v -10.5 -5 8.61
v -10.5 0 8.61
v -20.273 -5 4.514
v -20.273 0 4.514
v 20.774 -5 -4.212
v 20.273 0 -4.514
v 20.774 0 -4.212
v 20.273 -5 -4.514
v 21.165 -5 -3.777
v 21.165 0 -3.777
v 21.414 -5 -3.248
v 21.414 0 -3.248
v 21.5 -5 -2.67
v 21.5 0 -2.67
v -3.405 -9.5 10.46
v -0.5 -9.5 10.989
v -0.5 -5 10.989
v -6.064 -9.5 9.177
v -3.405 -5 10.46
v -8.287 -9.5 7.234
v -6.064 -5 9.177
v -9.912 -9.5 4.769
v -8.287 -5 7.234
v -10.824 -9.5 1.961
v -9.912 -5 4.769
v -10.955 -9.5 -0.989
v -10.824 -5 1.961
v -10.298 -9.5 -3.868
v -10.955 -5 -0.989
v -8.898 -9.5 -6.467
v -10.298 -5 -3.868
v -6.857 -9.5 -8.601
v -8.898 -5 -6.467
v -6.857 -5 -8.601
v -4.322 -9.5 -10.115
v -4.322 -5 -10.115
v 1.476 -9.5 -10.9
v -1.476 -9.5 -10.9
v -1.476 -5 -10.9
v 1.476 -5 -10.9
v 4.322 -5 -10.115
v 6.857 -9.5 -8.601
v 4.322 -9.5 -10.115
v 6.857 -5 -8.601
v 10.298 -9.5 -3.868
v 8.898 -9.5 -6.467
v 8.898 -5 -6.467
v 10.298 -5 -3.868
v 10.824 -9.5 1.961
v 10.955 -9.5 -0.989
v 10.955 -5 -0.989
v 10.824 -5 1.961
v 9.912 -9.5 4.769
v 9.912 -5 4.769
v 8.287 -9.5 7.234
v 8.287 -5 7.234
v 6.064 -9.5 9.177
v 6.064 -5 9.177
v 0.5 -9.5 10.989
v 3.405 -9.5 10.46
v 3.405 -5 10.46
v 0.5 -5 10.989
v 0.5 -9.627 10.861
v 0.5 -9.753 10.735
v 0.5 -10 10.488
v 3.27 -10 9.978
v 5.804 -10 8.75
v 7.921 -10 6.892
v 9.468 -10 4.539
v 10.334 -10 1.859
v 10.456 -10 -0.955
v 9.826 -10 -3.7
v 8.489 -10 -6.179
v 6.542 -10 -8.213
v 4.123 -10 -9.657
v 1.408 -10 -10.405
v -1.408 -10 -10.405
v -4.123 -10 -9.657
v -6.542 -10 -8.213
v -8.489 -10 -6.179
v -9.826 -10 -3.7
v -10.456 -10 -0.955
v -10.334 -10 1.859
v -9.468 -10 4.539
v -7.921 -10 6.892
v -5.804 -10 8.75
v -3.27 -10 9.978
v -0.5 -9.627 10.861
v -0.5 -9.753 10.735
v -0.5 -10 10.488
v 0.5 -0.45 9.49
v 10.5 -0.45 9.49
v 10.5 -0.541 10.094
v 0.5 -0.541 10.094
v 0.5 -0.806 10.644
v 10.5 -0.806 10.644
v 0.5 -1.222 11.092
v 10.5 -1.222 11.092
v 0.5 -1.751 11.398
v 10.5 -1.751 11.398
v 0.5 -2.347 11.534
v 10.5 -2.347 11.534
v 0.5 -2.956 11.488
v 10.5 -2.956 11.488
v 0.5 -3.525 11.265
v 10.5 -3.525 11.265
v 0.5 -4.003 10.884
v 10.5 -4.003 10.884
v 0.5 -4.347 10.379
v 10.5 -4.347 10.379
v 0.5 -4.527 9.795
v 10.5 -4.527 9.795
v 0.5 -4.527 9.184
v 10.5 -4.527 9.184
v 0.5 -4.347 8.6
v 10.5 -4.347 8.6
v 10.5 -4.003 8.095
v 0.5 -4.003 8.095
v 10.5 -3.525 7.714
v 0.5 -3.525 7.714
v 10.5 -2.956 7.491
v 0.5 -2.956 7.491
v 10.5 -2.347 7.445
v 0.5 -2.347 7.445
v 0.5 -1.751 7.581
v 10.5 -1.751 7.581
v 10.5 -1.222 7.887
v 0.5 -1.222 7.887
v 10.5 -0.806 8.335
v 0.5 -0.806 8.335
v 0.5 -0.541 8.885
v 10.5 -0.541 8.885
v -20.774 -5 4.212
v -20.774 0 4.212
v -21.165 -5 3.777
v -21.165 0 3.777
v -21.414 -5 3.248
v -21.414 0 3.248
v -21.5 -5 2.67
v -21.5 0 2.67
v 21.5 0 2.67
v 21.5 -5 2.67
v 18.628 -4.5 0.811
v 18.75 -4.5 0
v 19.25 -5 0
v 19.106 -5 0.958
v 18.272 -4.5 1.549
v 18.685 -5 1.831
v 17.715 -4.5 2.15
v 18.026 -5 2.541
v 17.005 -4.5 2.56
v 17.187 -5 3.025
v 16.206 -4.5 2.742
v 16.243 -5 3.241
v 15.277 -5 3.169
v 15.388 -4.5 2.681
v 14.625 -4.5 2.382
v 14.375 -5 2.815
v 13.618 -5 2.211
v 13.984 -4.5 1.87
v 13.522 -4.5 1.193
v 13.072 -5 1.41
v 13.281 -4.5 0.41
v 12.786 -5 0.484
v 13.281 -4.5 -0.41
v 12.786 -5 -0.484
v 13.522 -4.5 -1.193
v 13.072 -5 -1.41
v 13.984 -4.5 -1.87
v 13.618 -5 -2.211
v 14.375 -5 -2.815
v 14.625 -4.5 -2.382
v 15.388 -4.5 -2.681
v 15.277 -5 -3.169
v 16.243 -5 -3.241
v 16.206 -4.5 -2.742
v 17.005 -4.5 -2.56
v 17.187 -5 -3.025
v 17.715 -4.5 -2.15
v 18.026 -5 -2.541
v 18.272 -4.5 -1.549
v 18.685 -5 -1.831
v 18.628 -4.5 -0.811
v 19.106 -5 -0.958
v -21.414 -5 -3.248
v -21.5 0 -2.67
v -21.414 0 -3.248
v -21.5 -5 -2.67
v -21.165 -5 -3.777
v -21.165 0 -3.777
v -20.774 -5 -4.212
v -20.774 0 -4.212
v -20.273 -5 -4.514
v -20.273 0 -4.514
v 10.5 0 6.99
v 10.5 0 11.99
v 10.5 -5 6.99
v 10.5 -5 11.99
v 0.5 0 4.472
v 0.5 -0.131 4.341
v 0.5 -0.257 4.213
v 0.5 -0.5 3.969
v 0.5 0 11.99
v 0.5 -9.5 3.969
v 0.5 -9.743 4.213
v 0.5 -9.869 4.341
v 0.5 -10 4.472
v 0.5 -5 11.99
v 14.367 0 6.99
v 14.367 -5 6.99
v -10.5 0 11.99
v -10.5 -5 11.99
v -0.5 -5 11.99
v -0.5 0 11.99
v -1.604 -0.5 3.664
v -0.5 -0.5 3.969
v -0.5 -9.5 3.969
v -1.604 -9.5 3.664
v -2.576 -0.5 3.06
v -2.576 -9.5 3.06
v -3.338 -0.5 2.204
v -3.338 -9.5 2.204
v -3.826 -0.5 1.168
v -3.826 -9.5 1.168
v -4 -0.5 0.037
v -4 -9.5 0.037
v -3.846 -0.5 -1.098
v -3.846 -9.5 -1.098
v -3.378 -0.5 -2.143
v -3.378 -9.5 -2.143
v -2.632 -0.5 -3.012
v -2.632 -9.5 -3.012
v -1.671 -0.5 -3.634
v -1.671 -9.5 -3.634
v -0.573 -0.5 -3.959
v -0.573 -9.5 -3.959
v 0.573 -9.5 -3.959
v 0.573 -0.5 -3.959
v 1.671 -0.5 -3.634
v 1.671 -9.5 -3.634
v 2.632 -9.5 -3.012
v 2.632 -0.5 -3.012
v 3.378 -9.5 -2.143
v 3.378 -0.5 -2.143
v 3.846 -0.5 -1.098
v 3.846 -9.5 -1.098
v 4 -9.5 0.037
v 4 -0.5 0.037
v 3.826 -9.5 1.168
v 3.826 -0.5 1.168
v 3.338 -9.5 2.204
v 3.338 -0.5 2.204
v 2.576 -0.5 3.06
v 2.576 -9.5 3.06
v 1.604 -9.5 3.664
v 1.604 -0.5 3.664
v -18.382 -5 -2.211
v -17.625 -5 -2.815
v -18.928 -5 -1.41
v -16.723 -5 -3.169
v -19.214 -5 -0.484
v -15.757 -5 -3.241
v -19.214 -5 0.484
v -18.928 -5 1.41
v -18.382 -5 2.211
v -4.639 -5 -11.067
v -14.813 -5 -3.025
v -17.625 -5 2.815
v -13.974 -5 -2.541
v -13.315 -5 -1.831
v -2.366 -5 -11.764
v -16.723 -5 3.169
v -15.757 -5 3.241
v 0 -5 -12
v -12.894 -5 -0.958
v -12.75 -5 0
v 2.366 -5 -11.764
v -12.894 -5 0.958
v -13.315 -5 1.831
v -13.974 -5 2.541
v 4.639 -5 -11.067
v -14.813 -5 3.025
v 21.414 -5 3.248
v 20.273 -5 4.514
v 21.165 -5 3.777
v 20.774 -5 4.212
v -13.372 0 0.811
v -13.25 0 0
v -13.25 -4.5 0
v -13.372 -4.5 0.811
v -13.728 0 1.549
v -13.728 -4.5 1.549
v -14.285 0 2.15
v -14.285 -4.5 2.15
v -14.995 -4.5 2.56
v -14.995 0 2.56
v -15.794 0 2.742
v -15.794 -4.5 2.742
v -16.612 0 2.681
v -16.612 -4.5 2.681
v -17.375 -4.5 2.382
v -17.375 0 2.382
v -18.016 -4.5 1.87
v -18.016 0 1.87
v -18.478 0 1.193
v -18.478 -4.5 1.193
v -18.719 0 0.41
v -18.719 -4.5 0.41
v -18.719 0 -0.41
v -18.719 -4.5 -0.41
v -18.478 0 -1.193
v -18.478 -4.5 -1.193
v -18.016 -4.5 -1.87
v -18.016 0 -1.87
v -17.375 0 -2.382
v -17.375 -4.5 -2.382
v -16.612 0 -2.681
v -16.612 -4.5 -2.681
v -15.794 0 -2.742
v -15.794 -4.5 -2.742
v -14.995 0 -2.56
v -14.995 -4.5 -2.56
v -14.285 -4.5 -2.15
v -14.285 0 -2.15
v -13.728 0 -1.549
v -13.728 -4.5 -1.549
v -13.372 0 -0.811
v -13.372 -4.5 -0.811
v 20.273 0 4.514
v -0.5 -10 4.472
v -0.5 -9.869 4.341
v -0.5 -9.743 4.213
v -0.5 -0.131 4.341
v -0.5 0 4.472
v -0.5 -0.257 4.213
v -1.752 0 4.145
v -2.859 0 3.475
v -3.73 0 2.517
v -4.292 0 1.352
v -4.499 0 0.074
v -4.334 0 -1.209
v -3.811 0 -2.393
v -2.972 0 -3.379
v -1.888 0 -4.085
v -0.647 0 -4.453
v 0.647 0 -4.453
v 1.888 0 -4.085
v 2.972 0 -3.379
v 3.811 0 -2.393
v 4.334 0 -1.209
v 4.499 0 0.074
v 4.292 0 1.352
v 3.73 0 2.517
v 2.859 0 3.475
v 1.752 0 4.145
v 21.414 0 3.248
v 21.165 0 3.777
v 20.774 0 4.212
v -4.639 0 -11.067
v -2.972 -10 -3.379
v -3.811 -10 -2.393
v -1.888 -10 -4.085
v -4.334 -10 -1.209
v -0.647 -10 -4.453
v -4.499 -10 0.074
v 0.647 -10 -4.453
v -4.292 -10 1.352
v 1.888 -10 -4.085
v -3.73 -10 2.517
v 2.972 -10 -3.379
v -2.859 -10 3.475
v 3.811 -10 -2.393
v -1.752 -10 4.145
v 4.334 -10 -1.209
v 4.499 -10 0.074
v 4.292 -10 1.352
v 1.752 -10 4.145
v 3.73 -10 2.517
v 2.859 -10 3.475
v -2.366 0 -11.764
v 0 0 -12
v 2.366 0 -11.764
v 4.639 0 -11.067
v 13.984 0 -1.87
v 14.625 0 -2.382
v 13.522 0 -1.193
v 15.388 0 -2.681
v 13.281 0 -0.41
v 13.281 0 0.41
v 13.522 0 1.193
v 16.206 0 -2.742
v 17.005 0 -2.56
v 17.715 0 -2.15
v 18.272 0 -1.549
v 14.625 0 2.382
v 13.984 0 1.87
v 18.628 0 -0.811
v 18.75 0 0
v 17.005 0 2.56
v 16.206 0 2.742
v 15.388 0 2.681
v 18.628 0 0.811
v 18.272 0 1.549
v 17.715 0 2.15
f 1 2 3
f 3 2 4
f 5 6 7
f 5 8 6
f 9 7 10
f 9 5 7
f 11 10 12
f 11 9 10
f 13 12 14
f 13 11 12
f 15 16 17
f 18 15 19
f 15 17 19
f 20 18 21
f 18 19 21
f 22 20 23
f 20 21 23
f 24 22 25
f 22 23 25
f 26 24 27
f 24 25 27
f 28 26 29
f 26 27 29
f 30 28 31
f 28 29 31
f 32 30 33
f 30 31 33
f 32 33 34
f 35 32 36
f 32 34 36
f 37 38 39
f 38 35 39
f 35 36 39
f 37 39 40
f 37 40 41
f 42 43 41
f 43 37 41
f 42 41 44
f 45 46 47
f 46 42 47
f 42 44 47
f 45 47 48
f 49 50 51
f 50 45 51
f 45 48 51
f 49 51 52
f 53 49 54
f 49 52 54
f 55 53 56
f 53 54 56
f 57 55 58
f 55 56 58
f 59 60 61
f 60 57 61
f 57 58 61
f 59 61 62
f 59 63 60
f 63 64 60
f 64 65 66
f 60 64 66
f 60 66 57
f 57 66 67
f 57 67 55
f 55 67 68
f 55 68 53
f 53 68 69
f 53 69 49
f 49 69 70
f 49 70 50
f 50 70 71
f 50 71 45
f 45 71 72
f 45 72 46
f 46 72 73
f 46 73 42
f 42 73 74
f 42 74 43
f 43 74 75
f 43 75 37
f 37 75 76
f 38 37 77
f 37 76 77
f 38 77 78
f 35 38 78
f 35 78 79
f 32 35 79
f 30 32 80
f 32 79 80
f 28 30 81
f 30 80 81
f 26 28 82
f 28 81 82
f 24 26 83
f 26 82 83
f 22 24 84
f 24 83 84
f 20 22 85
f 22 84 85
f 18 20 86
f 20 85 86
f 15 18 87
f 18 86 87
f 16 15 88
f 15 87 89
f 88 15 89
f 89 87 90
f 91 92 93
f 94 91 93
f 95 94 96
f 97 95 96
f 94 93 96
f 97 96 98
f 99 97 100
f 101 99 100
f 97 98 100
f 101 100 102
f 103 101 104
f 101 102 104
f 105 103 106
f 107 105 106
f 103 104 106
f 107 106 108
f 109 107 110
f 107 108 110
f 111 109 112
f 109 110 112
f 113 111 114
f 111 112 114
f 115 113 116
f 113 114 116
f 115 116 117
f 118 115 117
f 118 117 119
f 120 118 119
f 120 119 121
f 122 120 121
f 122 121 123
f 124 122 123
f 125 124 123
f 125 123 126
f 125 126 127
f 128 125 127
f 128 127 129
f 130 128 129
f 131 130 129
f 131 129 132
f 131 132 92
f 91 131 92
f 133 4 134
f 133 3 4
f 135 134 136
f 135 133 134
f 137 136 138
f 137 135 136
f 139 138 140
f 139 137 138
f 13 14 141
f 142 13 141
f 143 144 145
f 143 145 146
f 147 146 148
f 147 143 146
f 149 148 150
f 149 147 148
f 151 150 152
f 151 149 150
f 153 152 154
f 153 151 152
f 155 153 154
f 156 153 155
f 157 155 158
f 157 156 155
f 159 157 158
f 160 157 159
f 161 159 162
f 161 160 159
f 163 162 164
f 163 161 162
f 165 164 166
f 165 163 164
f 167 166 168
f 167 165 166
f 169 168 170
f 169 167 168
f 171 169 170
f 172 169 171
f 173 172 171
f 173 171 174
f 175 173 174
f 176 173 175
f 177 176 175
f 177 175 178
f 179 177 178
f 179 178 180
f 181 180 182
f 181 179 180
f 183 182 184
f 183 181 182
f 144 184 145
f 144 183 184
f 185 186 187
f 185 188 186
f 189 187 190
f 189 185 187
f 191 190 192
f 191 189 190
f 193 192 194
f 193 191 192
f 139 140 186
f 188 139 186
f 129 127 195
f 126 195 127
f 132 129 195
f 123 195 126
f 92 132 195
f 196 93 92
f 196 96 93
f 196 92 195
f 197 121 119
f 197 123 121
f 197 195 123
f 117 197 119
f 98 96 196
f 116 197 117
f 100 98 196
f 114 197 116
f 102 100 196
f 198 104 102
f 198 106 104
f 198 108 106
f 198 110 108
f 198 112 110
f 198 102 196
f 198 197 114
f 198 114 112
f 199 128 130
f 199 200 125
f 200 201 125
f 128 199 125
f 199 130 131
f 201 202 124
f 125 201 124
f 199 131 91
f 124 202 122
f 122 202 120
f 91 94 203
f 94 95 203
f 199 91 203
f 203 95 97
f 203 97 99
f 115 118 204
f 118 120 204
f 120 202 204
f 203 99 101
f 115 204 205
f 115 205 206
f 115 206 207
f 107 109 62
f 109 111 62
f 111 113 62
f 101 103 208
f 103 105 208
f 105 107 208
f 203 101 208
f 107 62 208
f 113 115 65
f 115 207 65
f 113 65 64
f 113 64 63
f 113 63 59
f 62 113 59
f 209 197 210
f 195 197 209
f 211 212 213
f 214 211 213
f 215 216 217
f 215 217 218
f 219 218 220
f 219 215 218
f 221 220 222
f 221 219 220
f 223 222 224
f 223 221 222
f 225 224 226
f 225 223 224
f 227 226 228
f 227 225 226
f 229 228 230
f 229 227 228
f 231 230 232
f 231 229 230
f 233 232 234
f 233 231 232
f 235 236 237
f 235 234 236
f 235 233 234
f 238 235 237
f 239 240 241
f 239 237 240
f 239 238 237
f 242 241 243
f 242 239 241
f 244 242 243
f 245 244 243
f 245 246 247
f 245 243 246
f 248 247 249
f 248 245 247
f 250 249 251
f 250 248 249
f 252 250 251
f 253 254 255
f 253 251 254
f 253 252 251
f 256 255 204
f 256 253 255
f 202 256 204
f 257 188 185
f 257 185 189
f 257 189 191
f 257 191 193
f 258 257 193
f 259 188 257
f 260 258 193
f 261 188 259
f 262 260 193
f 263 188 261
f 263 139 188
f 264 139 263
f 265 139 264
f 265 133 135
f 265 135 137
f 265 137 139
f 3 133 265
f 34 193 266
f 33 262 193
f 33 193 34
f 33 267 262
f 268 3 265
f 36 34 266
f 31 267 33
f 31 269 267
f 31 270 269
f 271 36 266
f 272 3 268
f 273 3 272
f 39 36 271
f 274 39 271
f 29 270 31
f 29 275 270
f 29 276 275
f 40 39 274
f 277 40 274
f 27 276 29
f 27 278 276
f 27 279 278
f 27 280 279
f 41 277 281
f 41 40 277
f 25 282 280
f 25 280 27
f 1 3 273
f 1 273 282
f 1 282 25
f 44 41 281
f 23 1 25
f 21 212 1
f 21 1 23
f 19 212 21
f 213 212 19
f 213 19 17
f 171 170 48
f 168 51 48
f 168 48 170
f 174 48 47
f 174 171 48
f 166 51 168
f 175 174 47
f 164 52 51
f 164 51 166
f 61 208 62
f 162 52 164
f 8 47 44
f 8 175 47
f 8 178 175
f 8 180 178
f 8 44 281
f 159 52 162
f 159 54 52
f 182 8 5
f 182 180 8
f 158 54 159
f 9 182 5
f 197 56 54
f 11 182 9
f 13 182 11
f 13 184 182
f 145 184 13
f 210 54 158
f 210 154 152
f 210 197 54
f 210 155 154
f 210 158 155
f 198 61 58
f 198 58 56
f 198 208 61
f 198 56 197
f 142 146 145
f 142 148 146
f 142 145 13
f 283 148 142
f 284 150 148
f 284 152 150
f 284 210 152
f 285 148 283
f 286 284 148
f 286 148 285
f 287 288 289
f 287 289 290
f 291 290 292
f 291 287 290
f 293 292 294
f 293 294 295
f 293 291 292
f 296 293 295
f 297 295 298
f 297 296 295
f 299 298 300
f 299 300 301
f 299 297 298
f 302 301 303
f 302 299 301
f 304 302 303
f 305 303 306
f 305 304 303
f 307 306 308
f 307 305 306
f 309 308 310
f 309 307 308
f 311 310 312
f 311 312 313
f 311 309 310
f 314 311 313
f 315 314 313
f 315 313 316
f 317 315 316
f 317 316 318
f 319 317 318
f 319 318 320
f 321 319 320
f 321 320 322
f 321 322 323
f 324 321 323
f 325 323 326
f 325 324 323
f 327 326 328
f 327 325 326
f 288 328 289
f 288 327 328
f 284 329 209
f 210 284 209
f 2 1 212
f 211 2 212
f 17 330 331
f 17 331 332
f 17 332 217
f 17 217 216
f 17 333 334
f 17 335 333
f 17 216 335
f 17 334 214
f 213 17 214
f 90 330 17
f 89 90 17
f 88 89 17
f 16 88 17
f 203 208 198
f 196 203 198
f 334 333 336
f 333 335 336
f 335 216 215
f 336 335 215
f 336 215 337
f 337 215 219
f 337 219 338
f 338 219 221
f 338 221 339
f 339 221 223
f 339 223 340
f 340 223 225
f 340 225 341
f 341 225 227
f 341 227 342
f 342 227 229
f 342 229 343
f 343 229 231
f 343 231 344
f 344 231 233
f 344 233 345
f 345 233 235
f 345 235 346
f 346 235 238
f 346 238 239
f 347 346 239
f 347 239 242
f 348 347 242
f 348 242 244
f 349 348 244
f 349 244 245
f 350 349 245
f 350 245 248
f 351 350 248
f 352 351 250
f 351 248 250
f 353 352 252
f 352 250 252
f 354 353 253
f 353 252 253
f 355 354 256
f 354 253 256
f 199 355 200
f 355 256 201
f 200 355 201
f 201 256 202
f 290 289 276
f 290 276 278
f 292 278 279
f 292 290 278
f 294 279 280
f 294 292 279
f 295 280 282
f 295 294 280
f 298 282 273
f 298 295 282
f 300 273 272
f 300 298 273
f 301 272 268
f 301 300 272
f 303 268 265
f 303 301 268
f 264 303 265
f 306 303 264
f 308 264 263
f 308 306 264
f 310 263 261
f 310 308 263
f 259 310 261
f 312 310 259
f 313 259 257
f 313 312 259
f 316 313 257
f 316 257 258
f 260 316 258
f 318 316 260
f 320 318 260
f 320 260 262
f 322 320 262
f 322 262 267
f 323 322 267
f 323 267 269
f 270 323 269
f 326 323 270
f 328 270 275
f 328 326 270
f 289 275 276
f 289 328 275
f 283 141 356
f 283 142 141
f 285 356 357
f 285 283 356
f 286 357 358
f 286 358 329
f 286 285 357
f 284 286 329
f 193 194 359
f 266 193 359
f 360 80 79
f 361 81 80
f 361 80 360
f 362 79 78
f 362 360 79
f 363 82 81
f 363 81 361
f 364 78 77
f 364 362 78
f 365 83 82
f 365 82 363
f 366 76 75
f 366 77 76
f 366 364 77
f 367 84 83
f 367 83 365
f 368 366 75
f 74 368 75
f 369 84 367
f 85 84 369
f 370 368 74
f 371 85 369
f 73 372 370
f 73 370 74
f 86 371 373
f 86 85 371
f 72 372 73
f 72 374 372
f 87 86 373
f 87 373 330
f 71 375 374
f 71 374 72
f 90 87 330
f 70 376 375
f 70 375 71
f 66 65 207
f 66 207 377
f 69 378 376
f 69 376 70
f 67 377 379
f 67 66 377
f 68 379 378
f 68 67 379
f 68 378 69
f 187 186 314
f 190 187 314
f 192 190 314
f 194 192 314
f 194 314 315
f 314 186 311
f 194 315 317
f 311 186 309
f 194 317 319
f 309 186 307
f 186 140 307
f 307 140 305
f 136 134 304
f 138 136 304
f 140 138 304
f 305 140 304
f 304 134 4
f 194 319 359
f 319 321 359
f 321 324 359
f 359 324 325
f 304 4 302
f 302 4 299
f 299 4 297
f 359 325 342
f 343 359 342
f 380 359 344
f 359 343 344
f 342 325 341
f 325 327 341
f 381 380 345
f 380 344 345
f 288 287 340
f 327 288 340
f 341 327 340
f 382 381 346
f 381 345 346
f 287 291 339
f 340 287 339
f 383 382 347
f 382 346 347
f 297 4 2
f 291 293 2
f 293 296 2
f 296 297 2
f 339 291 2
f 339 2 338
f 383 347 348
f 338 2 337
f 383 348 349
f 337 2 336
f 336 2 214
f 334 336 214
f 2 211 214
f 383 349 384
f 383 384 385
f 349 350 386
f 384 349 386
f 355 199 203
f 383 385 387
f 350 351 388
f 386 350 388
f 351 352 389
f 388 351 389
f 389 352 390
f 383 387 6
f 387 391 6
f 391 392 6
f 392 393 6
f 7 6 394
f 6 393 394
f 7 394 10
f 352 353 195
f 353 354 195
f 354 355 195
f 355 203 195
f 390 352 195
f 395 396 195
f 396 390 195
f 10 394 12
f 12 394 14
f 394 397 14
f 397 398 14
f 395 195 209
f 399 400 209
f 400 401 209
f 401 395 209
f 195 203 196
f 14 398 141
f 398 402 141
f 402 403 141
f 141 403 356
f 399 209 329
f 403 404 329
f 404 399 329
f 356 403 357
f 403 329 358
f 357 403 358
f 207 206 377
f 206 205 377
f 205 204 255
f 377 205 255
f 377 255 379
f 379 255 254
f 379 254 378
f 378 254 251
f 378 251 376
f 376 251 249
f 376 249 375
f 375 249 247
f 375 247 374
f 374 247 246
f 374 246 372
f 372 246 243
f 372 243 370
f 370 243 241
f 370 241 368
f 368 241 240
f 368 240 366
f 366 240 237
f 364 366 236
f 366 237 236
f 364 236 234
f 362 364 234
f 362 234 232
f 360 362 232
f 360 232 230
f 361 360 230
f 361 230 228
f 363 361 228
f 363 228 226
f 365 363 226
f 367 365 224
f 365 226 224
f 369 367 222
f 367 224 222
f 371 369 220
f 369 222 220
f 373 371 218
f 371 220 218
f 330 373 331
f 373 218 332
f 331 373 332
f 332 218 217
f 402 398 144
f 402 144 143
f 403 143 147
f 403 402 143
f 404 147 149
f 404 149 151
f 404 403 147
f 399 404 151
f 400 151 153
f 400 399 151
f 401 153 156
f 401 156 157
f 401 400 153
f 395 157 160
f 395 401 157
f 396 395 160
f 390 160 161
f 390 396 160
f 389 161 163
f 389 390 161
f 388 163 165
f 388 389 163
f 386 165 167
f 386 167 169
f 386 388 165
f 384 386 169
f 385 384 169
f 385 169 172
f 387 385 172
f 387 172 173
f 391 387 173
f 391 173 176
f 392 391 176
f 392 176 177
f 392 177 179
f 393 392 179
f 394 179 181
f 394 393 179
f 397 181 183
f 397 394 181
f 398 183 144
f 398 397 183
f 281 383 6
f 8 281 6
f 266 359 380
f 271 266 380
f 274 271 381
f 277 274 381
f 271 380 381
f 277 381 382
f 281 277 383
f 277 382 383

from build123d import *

# Parameters (mm, degrees)
F0_R      = 2.75
F0_R_2    = 4
F1_DEPTH  = 5
F2_R      = 11
F2_R_2    = 4
F3_DEPTH  = 5
F4_W      = 1
F4_H      = 18
F5_DEPTH  = 10.001
F6_W      = 10
F6_H      = 8.020952
F7_DEPTH  = 5
F8_W      = 5
F8_H      = 5
F9_DEPTH  = 11.001
F10_R     = 2.05
F11_DEPTH = 11
F12_SIZE  = 0.5
F13_R     = 2


with BuildPart() as f1:
    # F0 (on Front) → F1 (new body)
    with BuildSketch(Plane.XZ):
        with BuildLine():
            Line((-21.5, 4), (-21.5, -4))
            Line((-21.5, -4), (-4.638661, -11.067196))
            ThreePointArc((-4.638661, -11.067196), (0, -12), (4.638661, -11.067196))
            Line((4.638661, -11.067196), (21.5, -4))
            Line((21.5, -4), (21.5, 4))
            Line((21.5, 4), (4.638661, 11.067196))
            ThreePointArc((4.638661, 11.067196), (0, 12), (-4.638661, 11.067196))
            Line((-4.638661, 11.067196), (-21.5, 4))
        make_face()
        with Locations((-16, 0)):
            Circle(F0_R, mode=Mode.SUBTRACT)
        Circle(F0_R_2, mode=Mode.SUBTRACT)
        with Locations((16, 0)):
            Circle(F0_R, mode=Mode.SUBTRACT)
    extrude(amount=F1_DEPTH)

    # F2 (on face) → F3 (join)
    with BuildSketch(Plane.XZ.offset(5)):
        Circle(F2_R)
        Circle(F2_R_2, mode=Mode.SUBTRACT)
    extrude(amount=F3_DEPTH)

    # F4 (on face) → F5 (cut, through all)
    with BuildSketch(Plane.XZ.offset(10)):
        with Locations((0, 9)):
            Rectangle(F4_W, F4_H)
    extrude(amount=-F5_DEPTH, mode=Mode.SUBTRACT)

    # F6 (on face) → F7 (join, through all)
    with BuildSketch(Plane.XZ.offset(5)):
        with Locations((-5.5, 7.979103)):
            Rectangle(F6_W, F6_H)
        with Locations((5.5, 7.979103)):
            Rectangle(F6_W, F6_H)
    extrude(amount=-F7_DEPTH)

    # F8 (on face) → F9 (cut, through all)
    with BuildSketch(Plane.YZ.offset(10.5)):
        with Locations((-2.5, 9.489579)):
            Rectangle(F8_W, F8_H)
    extrude(amount=F9_DEPTH, mode=Mode.SUBTRACT)

    # F10 (on face) → F11 (cut, through all)
    with BuildSketch(Plane.YZ.offset(10.5)):
        with Locations((-2.5, 9.489579)):
            Circle(F10_R)
    extrude(amount=-F11_DEPTH, mode=Mode.SUBTRACT)

    # F12
    f12_edges = [f1.edges().sort_by_distance(p)[0] for p in [
        (0, 0, -4),
        (0, -10, -4),
        (0, -10, -11),
        (13.25, -5, 0),
        (-18.75, -5, 0),
    ]]
    chamfer(f12_edges, length=F12_SIZE)

    # F13
    f13_edges = [f1.edges().sort_by_distance(p)[0] for p in [
        (21.5, -2.5, -4),
        (21.5, -2.5, 4),
        (-21.5, -2.5, -4),
        (-21.5, -2.5, 4),
    ]]
    fillet(f13_edges, radius=F13_R)


solid = f1.part
